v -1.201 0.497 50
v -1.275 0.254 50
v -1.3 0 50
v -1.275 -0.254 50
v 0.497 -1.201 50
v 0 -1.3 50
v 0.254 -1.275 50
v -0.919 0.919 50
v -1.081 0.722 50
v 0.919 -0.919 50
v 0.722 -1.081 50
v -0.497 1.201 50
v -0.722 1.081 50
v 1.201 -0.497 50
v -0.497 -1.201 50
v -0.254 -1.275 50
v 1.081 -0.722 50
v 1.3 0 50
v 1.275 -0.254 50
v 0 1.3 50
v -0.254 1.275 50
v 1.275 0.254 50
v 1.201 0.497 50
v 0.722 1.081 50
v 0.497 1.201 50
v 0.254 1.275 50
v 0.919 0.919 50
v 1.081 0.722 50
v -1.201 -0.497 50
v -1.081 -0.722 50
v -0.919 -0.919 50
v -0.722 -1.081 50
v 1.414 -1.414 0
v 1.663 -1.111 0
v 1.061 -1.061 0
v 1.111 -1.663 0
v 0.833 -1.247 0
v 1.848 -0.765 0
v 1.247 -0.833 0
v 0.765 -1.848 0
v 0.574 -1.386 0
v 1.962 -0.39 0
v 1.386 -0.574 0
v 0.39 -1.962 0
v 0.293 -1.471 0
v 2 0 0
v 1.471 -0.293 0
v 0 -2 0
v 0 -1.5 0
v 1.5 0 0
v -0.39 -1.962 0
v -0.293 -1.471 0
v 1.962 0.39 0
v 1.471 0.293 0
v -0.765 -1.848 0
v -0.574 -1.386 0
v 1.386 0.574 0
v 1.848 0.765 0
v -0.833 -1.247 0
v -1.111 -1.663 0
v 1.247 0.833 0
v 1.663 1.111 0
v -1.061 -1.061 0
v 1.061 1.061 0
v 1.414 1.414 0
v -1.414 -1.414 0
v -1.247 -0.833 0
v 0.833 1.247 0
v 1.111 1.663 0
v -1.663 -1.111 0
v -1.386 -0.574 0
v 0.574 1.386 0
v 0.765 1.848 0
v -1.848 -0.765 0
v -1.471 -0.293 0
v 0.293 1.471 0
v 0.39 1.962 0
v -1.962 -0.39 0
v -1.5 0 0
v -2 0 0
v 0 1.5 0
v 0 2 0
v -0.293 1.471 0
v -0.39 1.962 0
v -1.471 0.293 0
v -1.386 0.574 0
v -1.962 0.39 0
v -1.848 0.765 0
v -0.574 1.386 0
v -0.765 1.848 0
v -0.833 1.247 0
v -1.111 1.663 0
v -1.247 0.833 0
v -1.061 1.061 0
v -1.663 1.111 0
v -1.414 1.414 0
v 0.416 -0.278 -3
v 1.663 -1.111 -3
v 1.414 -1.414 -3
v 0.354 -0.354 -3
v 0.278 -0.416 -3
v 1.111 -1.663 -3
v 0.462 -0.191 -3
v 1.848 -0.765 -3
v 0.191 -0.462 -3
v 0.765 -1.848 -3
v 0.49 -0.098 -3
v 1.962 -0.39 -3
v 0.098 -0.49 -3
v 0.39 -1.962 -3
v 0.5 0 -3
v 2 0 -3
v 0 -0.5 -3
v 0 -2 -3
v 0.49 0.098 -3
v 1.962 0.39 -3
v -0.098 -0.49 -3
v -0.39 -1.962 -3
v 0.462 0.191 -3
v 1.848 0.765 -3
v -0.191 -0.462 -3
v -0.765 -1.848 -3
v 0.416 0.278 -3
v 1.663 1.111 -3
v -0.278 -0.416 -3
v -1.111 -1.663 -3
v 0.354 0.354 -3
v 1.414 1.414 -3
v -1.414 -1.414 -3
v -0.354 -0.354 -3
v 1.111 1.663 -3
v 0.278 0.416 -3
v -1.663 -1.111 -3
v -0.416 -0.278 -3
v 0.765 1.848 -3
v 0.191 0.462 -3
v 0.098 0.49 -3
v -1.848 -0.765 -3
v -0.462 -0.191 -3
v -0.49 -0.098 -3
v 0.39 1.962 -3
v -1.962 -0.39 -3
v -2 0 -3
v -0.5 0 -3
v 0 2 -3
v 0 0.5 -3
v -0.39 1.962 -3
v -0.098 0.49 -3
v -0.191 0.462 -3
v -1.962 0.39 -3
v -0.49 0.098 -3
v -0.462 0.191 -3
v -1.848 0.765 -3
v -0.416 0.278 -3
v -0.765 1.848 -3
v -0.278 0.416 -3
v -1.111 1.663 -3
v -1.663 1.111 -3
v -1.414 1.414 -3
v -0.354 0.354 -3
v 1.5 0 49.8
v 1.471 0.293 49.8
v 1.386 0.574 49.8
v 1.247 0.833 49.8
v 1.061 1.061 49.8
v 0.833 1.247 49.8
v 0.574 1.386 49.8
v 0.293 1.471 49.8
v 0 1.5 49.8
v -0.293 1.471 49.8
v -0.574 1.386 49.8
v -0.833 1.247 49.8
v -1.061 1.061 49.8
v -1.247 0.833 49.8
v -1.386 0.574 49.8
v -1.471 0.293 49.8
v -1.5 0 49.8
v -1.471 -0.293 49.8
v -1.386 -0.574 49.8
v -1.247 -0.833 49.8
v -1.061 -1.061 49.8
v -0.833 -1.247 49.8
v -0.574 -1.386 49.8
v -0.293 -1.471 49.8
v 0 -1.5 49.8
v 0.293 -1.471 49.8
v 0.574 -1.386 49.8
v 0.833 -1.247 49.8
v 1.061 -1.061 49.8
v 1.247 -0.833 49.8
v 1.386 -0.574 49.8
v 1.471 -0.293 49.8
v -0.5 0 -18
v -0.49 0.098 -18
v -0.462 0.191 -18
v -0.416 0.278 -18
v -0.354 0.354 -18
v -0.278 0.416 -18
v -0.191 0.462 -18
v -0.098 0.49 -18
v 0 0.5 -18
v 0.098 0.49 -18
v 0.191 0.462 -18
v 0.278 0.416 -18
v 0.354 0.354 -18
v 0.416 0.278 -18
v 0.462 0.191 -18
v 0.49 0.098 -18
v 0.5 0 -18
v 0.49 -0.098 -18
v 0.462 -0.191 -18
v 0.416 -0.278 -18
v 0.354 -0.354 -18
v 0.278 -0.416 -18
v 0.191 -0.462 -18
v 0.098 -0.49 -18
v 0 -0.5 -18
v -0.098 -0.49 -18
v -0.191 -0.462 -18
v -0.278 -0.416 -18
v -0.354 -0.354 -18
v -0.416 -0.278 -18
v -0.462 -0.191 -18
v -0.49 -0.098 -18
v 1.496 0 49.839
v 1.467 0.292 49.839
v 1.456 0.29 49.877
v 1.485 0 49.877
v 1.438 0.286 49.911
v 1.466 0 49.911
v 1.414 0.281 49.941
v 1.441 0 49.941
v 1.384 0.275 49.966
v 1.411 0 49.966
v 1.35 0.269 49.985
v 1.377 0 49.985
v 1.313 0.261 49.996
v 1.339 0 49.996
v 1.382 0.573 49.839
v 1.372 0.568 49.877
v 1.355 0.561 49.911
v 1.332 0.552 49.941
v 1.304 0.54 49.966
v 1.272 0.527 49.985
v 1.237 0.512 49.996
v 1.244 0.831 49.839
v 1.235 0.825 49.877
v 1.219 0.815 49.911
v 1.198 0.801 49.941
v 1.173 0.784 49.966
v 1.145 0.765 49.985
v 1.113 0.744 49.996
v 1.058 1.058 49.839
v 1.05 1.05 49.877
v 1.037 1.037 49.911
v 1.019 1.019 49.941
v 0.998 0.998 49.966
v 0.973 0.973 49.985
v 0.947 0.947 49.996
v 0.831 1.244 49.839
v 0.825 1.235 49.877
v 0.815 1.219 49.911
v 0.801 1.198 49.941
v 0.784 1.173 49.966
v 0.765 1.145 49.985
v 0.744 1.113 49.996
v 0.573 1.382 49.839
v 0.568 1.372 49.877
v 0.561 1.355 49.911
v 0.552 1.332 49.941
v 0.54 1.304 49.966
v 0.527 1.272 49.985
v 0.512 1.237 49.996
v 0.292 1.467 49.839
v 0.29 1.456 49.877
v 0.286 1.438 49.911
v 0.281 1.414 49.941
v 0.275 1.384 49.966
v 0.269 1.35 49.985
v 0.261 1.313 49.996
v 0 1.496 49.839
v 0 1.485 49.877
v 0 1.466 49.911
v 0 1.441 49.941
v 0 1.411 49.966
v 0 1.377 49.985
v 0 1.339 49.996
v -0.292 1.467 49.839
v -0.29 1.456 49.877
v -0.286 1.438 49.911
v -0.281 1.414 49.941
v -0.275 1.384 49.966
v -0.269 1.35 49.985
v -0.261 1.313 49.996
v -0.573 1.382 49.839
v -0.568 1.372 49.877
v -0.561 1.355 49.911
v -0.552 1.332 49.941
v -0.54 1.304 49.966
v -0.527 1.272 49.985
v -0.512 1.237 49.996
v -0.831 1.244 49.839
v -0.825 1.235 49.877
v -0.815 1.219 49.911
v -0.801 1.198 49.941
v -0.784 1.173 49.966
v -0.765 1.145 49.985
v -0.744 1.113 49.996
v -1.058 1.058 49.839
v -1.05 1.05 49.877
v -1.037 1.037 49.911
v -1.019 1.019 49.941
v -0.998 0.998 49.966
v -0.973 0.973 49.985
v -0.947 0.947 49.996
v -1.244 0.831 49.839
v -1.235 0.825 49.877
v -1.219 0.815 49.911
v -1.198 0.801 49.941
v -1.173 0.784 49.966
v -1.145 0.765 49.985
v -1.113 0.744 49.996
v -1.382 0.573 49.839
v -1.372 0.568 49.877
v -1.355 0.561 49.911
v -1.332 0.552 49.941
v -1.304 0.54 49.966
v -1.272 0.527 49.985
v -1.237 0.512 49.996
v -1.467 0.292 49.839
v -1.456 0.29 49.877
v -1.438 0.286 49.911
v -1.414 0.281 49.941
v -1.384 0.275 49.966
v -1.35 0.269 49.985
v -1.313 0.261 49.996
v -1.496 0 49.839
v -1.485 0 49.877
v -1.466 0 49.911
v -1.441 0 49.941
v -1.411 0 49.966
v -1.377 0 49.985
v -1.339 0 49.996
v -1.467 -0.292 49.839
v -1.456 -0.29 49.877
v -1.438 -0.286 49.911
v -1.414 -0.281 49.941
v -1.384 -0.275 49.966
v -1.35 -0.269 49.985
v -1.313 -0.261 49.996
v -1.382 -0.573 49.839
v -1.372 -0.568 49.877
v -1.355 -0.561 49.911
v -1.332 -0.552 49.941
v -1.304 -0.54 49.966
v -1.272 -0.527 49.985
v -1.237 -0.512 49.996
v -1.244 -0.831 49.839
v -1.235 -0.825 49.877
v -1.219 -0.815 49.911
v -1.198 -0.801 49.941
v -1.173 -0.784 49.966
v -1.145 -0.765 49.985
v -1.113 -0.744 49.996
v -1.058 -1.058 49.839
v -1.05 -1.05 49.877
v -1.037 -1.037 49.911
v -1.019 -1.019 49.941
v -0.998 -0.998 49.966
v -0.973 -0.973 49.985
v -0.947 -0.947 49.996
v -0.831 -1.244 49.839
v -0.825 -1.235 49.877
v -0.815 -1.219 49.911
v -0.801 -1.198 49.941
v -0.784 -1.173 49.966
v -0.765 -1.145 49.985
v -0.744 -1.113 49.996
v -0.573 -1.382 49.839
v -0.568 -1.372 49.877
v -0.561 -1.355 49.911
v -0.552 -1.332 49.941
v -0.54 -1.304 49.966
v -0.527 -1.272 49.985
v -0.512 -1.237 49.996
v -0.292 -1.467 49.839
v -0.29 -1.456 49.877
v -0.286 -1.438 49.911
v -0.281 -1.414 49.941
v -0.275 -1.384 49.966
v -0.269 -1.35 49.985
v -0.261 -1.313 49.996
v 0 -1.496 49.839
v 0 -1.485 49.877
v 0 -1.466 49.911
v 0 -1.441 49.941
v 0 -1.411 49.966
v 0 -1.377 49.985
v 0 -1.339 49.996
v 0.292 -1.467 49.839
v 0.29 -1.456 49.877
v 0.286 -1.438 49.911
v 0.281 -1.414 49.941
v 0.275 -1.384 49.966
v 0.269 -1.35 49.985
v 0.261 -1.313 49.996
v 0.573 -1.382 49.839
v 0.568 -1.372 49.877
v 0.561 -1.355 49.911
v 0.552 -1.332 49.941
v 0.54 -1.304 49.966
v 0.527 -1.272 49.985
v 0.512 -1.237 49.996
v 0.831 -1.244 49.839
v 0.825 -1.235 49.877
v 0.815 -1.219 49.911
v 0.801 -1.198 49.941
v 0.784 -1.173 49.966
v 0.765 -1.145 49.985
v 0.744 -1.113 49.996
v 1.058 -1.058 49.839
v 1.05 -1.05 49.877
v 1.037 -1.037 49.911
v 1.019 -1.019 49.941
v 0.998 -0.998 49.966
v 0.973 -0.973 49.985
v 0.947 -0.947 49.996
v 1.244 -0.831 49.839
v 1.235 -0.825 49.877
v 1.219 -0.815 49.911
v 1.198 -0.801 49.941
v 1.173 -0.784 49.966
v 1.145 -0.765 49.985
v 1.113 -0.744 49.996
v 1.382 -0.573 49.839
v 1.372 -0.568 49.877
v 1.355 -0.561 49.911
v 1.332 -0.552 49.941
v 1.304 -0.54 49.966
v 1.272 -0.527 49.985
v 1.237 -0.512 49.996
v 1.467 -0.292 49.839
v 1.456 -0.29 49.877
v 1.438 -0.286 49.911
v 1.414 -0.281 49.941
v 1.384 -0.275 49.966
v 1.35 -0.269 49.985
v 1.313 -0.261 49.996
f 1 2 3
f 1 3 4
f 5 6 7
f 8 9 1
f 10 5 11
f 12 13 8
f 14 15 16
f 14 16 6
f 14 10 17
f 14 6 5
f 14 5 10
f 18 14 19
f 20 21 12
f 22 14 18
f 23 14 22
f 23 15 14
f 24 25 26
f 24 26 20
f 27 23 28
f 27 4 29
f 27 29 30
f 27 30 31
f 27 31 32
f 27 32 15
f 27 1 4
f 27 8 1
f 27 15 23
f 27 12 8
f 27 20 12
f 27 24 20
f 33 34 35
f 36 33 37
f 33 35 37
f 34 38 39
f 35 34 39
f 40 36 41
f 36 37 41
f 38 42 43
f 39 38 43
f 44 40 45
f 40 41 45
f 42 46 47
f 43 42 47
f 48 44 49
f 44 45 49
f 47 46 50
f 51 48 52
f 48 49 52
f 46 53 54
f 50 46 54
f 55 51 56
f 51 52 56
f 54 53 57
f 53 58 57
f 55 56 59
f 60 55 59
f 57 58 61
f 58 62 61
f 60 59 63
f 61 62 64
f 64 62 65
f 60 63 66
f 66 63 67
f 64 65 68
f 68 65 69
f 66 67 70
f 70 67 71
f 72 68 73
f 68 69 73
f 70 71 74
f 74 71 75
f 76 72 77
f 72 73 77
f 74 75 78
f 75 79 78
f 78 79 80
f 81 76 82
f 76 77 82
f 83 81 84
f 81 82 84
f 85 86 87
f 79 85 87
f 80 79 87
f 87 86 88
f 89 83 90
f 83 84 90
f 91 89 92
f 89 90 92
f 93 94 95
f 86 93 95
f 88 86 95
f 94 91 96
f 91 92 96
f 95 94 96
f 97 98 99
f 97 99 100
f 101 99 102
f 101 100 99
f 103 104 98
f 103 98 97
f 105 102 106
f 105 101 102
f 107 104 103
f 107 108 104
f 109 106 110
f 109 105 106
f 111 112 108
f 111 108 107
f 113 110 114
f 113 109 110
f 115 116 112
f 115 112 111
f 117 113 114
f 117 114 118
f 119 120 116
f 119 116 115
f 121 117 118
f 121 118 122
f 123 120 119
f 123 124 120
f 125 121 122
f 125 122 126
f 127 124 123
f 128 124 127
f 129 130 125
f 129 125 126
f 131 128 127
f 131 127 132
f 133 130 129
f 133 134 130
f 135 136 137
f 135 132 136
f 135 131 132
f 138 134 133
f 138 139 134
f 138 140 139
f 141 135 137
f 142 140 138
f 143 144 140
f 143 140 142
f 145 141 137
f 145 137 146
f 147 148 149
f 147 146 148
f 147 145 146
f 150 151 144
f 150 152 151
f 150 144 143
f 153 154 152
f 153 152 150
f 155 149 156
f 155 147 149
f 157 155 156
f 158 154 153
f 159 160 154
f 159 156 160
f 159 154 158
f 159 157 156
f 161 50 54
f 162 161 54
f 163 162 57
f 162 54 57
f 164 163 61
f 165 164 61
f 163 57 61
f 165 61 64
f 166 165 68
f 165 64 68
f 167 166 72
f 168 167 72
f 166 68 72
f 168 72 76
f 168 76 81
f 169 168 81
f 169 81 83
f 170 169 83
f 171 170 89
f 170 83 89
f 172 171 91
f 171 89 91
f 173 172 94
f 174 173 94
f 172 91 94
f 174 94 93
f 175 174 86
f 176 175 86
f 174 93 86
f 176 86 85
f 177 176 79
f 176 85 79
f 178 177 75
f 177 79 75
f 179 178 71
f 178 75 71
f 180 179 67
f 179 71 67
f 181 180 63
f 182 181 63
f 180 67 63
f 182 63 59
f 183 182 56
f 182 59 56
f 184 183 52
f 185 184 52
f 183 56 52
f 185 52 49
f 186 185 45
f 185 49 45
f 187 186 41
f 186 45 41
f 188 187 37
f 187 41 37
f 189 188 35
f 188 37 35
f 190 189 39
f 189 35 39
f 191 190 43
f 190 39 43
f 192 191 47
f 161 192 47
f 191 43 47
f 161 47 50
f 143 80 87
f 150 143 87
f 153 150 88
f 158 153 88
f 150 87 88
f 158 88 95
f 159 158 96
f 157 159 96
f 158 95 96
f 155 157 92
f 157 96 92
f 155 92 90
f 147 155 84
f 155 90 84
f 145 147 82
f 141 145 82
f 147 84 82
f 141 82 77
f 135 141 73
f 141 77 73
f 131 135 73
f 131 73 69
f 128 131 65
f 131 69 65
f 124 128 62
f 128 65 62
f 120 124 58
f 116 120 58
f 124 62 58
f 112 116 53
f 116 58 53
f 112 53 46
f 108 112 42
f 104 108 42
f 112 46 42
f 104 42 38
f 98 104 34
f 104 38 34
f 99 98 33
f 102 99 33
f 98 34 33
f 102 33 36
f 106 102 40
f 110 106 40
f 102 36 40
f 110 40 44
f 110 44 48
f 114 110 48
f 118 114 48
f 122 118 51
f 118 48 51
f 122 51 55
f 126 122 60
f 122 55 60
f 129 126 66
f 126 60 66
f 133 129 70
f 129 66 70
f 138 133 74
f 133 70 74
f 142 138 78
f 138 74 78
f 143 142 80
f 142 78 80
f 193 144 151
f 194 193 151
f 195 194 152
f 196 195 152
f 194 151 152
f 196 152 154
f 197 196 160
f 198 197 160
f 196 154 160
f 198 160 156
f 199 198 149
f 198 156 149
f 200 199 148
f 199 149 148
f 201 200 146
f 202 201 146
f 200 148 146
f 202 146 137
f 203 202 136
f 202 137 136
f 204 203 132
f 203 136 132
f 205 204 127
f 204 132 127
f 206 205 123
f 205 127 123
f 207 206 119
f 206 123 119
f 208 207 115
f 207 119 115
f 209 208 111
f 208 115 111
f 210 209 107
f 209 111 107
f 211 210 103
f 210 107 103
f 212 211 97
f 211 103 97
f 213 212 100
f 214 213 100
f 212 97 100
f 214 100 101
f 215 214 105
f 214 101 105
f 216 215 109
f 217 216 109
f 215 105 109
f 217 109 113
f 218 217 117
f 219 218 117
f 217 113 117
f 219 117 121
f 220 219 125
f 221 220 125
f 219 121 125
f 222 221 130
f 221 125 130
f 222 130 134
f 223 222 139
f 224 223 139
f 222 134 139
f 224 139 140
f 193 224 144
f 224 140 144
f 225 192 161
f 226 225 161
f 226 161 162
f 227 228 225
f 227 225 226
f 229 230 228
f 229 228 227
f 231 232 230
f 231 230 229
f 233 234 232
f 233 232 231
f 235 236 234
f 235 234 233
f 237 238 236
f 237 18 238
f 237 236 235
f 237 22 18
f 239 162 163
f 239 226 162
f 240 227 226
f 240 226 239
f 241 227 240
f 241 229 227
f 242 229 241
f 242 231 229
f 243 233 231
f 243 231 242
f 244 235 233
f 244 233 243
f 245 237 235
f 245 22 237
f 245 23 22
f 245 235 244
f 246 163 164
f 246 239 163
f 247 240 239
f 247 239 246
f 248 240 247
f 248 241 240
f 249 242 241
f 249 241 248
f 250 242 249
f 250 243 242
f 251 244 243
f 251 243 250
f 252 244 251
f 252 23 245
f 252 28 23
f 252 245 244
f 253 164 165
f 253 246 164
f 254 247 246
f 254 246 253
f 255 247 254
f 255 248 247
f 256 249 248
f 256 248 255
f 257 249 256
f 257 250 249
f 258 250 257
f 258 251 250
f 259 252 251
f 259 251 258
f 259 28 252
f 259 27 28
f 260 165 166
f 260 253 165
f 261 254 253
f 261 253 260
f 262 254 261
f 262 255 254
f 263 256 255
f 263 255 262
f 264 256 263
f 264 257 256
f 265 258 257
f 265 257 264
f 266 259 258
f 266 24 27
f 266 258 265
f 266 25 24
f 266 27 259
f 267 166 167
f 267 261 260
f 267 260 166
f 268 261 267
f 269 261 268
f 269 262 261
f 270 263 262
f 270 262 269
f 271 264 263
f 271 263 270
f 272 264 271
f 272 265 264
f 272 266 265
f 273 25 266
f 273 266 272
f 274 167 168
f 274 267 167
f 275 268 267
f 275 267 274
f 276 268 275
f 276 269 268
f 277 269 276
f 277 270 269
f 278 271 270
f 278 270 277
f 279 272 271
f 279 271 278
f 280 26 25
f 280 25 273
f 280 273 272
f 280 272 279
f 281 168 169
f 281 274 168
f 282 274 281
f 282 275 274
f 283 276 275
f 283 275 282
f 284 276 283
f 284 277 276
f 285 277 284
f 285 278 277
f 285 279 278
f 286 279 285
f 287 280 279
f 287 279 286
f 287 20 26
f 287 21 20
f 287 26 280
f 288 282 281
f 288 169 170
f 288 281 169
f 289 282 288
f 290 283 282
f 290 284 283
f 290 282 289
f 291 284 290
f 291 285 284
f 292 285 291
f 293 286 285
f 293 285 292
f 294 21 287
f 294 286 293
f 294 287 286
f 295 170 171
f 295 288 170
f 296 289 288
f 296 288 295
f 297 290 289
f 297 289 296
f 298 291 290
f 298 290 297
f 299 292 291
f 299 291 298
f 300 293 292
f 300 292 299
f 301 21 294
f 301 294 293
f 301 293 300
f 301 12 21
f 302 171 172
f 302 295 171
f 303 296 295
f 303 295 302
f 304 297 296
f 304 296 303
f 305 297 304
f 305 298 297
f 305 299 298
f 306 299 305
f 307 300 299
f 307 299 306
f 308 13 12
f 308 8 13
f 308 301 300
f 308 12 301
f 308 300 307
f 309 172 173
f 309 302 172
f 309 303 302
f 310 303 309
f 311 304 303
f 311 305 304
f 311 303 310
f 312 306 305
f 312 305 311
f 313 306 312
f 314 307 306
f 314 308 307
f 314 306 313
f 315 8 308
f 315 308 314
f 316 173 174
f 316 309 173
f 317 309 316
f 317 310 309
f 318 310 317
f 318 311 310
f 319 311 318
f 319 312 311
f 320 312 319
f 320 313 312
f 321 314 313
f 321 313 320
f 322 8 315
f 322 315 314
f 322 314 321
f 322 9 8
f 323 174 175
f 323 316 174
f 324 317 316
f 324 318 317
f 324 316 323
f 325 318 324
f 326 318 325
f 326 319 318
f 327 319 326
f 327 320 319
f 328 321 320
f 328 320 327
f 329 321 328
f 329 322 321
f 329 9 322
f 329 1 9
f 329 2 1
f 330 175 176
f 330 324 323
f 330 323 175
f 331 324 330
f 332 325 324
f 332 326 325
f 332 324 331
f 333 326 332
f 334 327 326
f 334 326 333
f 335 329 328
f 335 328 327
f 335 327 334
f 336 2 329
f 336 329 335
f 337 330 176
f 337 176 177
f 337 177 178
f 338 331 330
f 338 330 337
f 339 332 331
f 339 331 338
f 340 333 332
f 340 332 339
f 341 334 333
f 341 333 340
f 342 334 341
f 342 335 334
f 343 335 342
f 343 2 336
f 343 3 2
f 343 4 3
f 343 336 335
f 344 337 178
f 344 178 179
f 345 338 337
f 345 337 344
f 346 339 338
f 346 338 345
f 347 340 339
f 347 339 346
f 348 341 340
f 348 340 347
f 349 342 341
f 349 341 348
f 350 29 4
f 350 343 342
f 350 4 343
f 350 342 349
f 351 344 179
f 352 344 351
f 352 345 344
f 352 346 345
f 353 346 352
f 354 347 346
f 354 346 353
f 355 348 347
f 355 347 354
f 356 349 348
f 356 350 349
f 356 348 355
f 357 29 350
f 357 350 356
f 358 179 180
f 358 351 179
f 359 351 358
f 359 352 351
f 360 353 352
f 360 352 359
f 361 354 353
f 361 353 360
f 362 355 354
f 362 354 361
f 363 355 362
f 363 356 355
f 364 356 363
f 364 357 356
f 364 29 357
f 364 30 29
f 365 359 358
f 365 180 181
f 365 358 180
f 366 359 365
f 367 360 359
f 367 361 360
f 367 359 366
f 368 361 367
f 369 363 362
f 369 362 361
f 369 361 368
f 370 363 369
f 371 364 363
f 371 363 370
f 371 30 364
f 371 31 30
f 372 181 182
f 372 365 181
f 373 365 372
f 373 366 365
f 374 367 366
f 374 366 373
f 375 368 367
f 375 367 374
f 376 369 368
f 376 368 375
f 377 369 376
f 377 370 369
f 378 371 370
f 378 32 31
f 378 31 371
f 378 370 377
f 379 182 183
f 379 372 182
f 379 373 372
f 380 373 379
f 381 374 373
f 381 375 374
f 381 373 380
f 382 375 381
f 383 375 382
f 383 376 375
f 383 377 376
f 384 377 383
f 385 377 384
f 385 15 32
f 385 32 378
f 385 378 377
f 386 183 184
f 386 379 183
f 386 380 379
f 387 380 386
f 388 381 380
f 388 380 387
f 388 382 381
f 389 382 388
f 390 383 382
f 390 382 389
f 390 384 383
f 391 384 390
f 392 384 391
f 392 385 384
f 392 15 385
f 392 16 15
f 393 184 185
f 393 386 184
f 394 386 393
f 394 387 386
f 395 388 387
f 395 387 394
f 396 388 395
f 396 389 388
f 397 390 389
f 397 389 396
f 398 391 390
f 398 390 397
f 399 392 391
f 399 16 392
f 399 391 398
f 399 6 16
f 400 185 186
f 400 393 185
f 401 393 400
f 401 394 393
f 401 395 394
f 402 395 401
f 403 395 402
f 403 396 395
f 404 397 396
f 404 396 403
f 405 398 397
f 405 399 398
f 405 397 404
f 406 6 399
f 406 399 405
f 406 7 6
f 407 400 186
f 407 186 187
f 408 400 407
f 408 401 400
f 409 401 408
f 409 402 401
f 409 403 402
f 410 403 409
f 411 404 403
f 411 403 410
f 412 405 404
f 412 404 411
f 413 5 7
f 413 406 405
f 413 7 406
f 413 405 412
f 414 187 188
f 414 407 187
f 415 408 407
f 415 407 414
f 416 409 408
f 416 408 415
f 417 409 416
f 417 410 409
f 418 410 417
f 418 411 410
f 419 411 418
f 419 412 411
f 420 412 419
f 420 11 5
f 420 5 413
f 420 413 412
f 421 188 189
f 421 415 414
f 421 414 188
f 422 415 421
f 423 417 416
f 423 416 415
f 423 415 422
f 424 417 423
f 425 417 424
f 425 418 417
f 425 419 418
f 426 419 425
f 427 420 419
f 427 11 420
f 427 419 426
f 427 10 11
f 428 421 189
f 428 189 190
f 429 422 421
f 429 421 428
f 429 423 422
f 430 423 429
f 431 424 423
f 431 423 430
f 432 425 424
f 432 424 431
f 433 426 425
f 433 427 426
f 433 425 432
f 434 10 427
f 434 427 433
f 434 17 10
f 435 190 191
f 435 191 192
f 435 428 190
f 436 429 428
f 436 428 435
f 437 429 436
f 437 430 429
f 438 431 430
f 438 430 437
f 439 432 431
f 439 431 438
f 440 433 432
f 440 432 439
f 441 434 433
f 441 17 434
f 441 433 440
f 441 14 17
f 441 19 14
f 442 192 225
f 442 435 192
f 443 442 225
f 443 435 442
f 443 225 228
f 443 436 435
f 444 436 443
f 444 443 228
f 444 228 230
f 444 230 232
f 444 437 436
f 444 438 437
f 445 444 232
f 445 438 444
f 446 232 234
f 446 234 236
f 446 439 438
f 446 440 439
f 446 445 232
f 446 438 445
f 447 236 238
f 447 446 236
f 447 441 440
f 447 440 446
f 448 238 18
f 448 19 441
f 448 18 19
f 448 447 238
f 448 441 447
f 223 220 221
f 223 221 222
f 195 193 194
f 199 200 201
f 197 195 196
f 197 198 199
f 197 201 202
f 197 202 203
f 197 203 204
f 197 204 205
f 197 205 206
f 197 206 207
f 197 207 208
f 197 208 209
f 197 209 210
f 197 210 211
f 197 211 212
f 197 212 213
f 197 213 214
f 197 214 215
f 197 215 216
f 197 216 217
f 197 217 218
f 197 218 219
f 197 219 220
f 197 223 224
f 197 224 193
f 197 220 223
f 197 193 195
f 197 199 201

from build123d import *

# Parameters (mm, degrees)
SKETCH1_R           = 1.5
BOSS_EXTRUDE1_DEPTH = 50
FILLET2_R           = 0.2
SKETCH2_R           = 2
BOSS_EXTRUDE2_DEPTH = 3
SKETCH3_R           = 0.5
BOSS_EXTRUDE3_DEPTH = 15


with BuildPart() as part:
    # Sketch1 → Boss-Extrude1 (new body)
    with BuildSketch(Plane.XY):
        Circle(SKETCH1_R)
    extrude(amount=BOSS_EXTRUDE1_DEPTH)

    # Fillet2
    fillet2_edges = [part.edges().sort_by_distance(p)[0] for p in [
        (-1.5, 0, 50),
    ]]
    fillet(fillet2_edges, radius=FILLET2_R)

    # Sketch2 → Boss-Extrude2 (add)
    with BuildSketch(Plane(origin=(0, 0, 0), x_dir=(-1, 0, 0), z_dir=(0, 0, -1))):
        Circle(SKETCH2_R)
    extrude(amount=BOSS_EXTRUDE2_DEPTH)

    # Sketch3 → Boss-Extrude3 (add)
    with BuildSketch(Plane(origin=(0, 0, -3), x_dir=(-1, 0, 0), z_dir=(0, 0, -1))):
        Circle(SKETCH3_R)
    extrude(amount=BOSS_EXTRUDE3_DEPTH)


solid = part.part
